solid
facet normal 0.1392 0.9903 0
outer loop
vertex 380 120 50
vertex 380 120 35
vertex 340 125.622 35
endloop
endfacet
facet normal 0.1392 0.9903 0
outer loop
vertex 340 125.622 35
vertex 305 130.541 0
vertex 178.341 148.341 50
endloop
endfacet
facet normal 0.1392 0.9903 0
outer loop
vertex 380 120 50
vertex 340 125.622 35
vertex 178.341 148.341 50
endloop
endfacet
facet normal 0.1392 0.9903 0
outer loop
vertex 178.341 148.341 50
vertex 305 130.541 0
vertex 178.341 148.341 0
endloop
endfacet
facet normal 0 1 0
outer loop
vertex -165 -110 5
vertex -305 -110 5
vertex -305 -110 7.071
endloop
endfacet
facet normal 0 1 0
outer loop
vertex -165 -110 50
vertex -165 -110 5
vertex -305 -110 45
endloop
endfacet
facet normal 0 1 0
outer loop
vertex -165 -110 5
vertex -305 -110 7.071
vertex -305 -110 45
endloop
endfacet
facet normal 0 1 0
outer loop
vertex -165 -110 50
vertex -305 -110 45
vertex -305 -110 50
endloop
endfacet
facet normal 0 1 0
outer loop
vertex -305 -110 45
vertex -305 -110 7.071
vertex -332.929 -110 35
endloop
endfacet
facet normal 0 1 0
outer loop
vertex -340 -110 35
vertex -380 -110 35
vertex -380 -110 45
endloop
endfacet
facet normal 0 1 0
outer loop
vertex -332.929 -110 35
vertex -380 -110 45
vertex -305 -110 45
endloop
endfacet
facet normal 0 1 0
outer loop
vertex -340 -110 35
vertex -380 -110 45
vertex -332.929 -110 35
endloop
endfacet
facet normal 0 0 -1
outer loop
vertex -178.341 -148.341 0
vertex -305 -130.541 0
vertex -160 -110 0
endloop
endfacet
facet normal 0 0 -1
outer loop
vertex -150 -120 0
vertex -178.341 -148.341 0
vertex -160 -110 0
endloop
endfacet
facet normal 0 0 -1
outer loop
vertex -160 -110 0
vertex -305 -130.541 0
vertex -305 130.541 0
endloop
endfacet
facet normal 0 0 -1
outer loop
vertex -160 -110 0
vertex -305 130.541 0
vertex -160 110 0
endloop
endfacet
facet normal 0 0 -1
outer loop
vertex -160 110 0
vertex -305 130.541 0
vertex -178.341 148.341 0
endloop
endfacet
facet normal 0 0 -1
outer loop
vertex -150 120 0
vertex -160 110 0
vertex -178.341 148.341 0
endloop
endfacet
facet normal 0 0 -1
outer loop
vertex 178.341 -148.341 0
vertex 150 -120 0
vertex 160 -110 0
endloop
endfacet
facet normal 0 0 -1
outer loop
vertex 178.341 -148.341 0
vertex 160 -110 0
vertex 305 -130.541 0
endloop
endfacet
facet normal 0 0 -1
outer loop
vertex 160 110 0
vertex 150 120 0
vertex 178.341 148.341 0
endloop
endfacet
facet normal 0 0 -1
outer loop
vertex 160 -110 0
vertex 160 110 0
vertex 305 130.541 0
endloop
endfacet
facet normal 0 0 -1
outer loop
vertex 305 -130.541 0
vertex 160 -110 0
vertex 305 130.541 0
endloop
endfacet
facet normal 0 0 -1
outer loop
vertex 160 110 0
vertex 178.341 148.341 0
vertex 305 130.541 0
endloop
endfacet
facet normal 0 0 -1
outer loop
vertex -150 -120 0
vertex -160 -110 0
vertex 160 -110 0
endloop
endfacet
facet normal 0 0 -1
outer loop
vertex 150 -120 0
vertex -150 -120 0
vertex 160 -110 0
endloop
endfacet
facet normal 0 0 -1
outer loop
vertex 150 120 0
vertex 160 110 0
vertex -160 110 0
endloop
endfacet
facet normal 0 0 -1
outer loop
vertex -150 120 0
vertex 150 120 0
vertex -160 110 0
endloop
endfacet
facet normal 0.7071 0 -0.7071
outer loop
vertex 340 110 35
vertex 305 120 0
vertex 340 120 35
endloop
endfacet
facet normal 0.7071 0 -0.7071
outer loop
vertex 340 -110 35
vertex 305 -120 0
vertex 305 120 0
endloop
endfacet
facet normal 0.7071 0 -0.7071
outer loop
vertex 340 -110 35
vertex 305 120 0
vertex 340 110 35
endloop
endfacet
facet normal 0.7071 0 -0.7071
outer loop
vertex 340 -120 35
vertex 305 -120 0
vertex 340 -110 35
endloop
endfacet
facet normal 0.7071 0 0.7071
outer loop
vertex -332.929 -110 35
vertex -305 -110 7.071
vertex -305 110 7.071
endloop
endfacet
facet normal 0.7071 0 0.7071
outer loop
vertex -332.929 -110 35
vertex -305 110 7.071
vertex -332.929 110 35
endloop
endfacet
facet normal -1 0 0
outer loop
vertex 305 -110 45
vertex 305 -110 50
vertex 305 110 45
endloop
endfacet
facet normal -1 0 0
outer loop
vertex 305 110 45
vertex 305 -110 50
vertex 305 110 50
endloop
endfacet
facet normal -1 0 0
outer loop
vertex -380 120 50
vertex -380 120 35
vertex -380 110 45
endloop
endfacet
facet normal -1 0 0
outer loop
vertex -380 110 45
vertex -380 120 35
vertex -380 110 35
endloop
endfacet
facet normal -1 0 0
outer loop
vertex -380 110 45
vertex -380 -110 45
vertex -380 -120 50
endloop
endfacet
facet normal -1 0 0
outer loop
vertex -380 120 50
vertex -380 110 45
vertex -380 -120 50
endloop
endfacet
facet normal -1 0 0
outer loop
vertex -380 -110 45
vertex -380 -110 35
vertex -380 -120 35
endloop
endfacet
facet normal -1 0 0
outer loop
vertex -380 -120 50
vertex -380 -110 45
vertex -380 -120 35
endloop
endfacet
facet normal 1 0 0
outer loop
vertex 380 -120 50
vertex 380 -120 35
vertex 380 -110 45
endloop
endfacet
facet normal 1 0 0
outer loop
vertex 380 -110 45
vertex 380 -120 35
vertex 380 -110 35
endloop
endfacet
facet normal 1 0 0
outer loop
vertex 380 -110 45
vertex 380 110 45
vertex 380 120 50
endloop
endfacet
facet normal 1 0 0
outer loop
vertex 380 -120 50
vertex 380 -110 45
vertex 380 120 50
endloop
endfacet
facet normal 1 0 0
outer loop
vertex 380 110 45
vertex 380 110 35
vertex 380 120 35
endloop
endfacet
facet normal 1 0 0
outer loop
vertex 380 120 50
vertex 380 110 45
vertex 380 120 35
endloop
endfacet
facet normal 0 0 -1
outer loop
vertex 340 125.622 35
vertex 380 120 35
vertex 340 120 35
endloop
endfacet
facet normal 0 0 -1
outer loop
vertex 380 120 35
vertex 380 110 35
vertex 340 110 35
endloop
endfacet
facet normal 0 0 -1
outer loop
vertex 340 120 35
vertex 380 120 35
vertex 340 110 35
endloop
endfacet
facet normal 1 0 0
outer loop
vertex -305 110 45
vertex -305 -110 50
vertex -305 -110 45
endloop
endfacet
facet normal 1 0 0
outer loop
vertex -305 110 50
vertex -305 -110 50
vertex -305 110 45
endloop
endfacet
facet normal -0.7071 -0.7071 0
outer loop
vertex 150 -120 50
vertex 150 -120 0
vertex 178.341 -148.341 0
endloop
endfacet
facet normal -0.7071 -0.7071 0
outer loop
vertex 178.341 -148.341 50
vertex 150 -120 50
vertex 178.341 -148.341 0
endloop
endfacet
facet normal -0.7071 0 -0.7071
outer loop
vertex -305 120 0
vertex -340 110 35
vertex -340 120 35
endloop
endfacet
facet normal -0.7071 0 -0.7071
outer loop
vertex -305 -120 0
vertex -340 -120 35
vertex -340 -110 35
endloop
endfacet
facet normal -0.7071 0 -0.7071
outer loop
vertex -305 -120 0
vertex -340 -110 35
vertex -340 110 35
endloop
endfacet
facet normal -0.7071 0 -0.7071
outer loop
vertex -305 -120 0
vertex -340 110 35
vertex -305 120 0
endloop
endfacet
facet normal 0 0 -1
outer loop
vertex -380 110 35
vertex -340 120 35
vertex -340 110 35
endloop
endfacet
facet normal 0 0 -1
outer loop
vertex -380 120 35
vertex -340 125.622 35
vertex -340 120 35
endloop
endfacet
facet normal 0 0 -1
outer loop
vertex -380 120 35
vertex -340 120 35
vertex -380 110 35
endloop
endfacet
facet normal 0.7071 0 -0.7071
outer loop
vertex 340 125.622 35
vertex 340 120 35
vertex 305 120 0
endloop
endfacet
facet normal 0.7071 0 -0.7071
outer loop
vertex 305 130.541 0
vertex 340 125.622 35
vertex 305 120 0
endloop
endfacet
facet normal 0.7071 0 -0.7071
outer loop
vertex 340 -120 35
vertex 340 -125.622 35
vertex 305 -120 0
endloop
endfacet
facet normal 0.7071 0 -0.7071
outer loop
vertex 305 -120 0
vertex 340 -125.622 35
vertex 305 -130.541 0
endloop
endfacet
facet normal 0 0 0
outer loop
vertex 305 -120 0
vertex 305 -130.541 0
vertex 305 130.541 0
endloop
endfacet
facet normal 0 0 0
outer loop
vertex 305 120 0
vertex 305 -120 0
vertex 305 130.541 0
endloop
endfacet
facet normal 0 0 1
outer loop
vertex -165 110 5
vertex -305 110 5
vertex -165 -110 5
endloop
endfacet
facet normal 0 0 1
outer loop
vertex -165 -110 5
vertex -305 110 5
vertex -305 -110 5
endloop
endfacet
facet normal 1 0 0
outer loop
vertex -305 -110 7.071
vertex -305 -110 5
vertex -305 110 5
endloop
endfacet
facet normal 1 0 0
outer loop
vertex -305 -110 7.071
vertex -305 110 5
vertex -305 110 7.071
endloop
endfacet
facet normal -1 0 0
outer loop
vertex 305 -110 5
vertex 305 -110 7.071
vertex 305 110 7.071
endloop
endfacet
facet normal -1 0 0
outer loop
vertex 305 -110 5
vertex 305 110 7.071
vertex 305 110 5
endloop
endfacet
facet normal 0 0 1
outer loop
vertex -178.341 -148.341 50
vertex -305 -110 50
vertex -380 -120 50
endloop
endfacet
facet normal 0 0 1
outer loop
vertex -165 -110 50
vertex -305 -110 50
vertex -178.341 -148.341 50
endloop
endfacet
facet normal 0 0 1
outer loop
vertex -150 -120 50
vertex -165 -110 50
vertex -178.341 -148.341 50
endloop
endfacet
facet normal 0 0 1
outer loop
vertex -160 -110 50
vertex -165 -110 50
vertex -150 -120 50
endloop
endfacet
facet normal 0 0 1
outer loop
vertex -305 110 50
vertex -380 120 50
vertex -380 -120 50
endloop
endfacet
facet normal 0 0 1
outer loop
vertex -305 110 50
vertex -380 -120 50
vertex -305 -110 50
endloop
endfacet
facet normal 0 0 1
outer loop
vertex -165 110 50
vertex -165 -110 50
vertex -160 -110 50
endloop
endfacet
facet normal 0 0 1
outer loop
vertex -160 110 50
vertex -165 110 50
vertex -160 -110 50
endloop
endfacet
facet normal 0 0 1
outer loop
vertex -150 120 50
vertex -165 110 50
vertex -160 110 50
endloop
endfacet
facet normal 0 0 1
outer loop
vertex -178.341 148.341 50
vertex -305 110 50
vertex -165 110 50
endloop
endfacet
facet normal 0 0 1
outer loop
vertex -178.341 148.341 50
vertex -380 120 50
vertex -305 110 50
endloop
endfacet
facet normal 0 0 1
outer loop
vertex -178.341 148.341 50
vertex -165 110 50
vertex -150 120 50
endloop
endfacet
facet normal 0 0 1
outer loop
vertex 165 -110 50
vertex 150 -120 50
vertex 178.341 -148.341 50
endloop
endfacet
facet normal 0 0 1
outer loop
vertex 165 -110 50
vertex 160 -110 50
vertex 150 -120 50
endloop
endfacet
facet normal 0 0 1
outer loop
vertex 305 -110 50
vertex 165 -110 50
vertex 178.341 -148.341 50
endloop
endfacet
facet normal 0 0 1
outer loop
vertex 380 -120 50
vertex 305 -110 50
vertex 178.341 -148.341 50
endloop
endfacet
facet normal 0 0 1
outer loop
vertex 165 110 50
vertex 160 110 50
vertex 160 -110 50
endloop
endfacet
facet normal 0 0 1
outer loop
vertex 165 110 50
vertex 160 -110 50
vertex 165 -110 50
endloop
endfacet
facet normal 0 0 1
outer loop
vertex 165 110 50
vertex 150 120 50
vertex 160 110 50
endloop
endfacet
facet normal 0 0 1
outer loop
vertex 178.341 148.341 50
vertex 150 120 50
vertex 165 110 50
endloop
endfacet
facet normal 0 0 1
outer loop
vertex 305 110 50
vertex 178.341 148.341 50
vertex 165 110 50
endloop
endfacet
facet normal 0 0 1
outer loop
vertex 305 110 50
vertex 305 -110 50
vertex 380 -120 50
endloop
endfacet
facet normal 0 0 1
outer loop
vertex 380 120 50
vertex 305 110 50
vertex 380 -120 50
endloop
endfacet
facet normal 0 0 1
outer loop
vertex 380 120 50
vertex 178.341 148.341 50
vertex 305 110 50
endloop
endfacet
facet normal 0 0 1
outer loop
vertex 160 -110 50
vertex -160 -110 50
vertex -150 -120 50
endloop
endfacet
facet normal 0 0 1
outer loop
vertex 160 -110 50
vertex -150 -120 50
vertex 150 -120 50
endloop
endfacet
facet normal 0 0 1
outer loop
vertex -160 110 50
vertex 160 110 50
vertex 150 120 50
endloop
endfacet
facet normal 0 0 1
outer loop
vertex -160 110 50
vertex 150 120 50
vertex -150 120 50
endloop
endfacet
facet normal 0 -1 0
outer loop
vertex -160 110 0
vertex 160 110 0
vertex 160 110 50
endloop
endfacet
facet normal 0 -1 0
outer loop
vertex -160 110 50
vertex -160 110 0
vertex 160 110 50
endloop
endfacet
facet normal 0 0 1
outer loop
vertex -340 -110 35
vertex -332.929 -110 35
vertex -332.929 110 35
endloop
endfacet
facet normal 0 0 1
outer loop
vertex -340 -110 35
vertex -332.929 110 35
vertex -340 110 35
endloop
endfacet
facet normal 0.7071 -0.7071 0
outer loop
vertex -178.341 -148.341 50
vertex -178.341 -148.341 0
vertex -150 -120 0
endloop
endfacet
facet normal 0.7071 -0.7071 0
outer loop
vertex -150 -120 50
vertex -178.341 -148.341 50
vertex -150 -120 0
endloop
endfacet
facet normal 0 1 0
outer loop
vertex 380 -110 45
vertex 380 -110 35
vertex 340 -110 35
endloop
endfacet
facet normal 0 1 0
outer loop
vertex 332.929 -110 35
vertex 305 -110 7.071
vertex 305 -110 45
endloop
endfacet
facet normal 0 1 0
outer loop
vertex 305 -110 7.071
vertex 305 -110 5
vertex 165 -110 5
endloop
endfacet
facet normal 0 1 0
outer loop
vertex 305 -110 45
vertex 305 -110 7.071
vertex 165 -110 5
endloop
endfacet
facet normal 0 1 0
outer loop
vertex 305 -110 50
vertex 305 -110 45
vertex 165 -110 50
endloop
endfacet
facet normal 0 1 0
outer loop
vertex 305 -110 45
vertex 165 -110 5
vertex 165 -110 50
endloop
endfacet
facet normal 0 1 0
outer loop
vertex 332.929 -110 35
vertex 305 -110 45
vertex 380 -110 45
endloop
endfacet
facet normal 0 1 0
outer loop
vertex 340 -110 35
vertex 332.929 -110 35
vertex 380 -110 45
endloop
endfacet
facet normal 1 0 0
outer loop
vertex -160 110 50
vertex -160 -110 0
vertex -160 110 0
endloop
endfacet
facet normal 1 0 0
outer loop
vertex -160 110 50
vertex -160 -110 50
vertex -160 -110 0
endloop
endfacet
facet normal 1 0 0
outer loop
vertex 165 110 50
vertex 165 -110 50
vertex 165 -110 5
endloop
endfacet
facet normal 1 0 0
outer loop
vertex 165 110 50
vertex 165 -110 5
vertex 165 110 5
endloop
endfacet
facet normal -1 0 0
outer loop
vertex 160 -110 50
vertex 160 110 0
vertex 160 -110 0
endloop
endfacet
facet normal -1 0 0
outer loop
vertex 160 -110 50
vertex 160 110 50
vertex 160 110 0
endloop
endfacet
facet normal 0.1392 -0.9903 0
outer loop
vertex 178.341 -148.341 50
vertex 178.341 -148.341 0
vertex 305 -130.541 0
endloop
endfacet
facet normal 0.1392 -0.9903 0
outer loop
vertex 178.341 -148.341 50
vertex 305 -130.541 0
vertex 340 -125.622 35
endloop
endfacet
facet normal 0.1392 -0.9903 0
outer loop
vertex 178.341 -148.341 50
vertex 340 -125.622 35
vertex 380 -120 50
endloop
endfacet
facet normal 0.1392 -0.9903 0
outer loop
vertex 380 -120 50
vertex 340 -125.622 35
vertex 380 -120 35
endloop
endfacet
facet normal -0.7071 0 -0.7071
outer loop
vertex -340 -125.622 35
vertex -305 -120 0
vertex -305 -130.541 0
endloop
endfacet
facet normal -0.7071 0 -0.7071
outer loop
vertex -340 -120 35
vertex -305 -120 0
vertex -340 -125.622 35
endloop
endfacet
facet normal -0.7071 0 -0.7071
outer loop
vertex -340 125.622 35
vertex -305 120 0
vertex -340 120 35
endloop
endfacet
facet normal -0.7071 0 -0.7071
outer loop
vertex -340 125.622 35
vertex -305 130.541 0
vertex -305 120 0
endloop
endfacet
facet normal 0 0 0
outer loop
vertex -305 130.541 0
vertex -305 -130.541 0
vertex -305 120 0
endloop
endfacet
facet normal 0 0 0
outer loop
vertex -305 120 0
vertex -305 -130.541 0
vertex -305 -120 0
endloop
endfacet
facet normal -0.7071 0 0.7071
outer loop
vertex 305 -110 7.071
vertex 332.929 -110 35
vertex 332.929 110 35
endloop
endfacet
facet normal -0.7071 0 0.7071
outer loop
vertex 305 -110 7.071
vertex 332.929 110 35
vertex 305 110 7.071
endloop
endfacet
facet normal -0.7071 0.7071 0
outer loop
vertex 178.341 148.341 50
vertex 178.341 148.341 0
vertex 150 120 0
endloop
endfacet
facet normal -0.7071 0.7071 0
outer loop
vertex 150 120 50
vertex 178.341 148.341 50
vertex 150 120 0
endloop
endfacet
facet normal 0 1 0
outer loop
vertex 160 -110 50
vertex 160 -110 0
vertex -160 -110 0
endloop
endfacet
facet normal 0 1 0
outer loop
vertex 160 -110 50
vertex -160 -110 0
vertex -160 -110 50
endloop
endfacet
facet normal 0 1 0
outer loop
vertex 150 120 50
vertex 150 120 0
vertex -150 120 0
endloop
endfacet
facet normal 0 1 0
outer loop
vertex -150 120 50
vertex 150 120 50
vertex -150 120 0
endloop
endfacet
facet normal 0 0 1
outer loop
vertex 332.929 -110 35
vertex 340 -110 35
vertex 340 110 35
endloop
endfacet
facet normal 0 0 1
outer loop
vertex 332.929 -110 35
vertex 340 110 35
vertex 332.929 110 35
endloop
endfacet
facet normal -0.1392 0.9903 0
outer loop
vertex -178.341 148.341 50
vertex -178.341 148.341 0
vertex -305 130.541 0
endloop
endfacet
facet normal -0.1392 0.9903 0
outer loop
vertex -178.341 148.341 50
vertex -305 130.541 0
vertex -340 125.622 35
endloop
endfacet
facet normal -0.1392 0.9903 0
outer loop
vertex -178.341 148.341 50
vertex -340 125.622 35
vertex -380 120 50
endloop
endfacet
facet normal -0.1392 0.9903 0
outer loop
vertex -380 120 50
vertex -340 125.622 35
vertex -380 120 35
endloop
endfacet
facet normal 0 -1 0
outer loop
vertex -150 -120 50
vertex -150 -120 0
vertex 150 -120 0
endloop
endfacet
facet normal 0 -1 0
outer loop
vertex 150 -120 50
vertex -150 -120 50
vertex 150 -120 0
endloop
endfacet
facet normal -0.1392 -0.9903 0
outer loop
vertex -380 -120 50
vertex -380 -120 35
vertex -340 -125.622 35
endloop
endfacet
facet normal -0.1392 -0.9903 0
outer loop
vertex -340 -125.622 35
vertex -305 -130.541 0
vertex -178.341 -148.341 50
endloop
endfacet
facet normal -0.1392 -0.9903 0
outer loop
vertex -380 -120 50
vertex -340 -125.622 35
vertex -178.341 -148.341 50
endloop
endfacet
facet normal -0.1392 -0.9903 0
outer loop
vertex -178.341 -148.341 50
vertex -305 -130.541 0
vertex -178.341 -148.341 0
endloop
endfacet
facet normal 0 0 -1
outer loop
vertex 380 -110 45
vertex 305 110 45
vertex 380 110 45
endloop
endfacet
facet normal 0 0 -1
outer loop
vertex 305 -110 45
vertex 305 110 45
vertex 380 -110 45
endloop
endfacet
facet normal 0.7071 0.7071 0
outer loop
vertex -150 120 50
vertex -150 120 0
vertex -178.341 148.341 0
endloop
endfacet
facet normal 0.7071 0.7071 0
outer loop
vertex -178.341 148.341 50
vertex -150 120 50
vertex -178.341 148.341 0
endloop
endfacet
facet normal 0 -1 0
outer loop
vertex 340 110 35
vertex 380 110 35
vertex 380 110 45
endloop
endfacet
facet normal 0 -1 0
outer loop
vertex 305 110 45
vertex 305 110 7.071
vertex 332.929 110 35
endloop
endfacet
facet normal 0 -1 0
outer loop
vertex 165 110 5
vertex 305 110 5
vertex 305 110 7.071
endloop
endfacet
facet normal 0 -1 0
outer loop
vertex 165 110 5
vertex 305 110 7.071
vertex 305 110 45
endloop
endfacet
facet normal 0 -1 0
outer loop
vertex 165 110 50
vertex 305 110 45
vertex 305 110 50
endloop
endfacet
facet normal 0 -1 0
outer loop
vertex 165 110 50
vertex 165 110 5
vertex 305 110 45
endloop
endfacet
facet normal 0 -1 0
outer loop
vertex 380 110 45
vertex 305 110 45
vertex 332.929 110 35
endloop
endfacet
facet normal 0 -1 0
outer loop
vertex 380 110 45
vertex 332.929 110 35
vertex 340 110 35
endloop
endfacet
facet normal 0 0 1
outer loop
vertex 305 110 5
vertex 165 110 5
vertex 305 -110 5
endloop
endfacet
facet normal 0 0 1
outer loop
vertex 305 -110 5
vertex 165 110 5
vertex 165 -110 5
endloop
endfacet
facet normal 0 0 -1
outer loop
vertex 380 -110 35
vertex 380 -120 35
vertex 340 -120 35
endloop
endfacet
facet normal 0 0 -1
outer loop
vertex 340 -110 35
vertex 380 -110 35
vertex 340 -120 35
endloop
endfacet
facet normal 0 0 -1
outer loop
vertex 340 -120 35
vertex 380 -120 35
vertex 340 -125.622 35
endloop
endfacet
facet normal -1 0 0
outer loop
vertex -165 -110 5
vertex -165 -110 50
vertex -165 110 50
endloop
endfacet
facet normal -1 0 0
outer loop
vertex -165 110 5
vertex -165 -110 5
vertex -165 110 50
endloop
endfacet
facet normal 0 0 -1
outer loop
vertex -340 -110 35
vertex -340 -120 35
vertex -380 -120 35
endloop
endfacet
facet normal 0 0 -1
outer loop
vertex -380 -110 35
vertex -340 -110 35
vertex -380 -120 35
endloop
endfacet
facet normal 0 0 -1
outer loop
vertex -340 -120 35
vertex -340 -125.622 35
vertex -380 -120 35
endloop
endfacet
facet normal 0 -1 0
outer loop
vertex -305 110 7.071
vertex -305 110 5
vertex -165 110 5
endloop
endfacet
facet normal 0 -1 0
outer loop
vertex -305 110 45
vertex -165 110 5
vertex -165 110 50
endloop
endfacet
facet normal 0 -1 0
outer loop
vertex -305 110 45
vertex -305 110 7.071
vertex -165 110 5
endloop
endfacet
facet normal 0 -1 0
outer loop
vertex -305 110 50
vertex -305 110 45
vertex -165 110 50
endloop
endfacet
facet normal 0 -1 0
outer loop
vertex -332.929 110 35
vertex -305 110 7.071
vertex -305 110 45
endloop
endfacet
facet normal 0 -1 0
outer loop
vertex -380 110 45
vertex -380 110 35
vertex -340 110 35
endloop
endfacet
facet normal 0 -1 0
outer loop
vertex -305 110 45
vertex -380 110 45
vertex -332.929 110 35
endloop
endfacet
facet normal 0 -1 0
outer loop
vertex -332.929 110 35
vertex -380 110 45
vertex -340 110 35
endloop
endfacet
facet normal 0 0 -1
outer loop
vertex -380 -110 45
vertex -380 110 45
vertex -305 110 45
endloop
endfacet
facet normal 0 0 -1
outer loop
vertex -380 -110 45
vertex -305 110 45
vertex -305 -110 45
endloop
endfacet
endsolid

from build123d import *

# Parameters (mm, degrees)
F1_DEPTH  = 50
F3_W      = 220
F3_H      = 40
F4_DEPTH  = 760
F5_DEPTH  = 240
F6_W      = 319.9999928474
F6_H      = 220
F6_W_2    = 280
F6_H_2    = 180
F7_DEPTH  = 50
F8_DEPTH  = 435.9292732552
F9_W      = 140
F9_H      = 220
F10_DEPTH = 10
F12_DEPTH = 240
F13_DEPTH = 25
F14_DEPTH = 25
F16_W     = 220
F16_H     = 40
F17_DEPTH = 5
F15_W     = 220
F15_H     = 40
F18_DEPTH = 5


with BuildPart() as f1:
    # F0 (on Top) → F1 (new body)
    with BuildSketch(Plane.XY):
        Polygon((-178.3412894642, 148.3412835037), (-380, 120), (-380, -120), (-178.3412894642, -148.3412835037), (-150.0000059605, -120), (150.0000059605, -120), (178.3412894642, -148.3412835037), (380, -120), (380, 120), (178.3412894642, 148.3412835037), (150.0000059605, 120), (-150.0000059605, 120), align=None)
    extrude(amount=F1_DEPTH)

    # F3 (on face) → F4 (cut)
    with BuildSketch(Plane(origin=(-380, 0, 0), x_dir=(0, -1, 0), z_dir=(-1, 0, 0))):
        with Locations((0, 25)):
            Rectangle(F3_W, F3_H)
    extrude(amount=-F4_DEPTH, mode=Mode.SUBTRACT)

    # F2 (on face) → F5 (cut)
    with BuildSketch(Plane.XZ.offset(120)):
        Polygon((305, 0), (380, 0), (380, 35), (340, 35), align=None)
        Polygon((-340, 35), (-380, 35), (-380, 0), (-305, 0), align=None)
    extrude(amount=-F5_DEPTH, mode=Mode.SUBTRACT)

    # F6 (on face) → F7 (cut)
    with BuildSketch(Plane.XY.offset(50)):
        Rectangle(F6_W, F6_H)
        Rectangle(F6_W_2, F6_H_2, mode=Mode.SUBTRACT)
    extrude(amount=-F7_DEPTH, mode=Mode.SUBTRACT)

    # F2 (on face) → F8 (cut, symmetric)
    with BuildSketch(Plane.XZ.offset(120)):
        Polygon((-340, 35), (-380, 35), (-380, 0), (-305, 0), align=None)
        Polygon((305, 0), (380, 0), (380, 35), (340, 35), align=None)
    extrude(amount=F8_DEPTH, both=True, mode=Mode.SUBTRACT)

    # F9 (on face) → F10 (cut)
    with BuildSketch(Plane.XY.offset(50)):
        with Locations((-234.9999964237, 0)):
            Rectangle(F9_W, F9_H)
        with Locations((234.9999964237, 0)):
            Rectangle(F9_W, F9_H)
    extrude(amount=-F10_DEPTH, mode=Mode.SUBTRACT)

    # F11 (on face) → F12 (join)
    with BuildSketch(Plane.XZ.offset(120)):
        Polygon((-305.0000059605, 0), (-305.0000059605, 7.0710678119), (-332.9289381486, 35), (-340.0000059605, 35), align=None)
        Polygon((340.0000059605, 35), (332.9289381486, 35), (305.0000059605, 7.0710678119), (305.0000059605, 0), align=None)
    extrude(amount=-F12_DEPTH)

    # F13 (cut): a face of the model
    f13_faces = [f1.faces().sort_by_distance(p)[0] for p in [
        (0, 0, 50),
    ]]
    extrude(f13_faces, amount=-F13_DEPTH, mode=Mode.SUBTRACT)

    # F14 (cut): a face of the model
    f14_faces = [f1.faces().sort_by_distance(p)[0] for p in [
        (0, 0, 0),
    ]]
    extrude(f14_faces, amount=-F14_DEPTH, mode=Mode.SUBTRACT)

    # F16 (on face) → F17 (join)
    with BuildSketch(Plane.YZ.offset(-159.9999964237)):
        with Locations((0, 25)):
            Rectangle(F16_W, F16_H)
    extrude(amount=-F17_DEPTH)

    # F15 (on face) → F18 (join)
    with BuildSketch(Plane(origin=(159.9999964237, 0, 0), x_dir=(0, -1, 0), z_dir=(-1, 0, 0))):
        with Locations((0, 25)):
            Rectangle(F15_W, F15_H)
    extrude(amount=-F18_DEPTH)


solid = f1.part
